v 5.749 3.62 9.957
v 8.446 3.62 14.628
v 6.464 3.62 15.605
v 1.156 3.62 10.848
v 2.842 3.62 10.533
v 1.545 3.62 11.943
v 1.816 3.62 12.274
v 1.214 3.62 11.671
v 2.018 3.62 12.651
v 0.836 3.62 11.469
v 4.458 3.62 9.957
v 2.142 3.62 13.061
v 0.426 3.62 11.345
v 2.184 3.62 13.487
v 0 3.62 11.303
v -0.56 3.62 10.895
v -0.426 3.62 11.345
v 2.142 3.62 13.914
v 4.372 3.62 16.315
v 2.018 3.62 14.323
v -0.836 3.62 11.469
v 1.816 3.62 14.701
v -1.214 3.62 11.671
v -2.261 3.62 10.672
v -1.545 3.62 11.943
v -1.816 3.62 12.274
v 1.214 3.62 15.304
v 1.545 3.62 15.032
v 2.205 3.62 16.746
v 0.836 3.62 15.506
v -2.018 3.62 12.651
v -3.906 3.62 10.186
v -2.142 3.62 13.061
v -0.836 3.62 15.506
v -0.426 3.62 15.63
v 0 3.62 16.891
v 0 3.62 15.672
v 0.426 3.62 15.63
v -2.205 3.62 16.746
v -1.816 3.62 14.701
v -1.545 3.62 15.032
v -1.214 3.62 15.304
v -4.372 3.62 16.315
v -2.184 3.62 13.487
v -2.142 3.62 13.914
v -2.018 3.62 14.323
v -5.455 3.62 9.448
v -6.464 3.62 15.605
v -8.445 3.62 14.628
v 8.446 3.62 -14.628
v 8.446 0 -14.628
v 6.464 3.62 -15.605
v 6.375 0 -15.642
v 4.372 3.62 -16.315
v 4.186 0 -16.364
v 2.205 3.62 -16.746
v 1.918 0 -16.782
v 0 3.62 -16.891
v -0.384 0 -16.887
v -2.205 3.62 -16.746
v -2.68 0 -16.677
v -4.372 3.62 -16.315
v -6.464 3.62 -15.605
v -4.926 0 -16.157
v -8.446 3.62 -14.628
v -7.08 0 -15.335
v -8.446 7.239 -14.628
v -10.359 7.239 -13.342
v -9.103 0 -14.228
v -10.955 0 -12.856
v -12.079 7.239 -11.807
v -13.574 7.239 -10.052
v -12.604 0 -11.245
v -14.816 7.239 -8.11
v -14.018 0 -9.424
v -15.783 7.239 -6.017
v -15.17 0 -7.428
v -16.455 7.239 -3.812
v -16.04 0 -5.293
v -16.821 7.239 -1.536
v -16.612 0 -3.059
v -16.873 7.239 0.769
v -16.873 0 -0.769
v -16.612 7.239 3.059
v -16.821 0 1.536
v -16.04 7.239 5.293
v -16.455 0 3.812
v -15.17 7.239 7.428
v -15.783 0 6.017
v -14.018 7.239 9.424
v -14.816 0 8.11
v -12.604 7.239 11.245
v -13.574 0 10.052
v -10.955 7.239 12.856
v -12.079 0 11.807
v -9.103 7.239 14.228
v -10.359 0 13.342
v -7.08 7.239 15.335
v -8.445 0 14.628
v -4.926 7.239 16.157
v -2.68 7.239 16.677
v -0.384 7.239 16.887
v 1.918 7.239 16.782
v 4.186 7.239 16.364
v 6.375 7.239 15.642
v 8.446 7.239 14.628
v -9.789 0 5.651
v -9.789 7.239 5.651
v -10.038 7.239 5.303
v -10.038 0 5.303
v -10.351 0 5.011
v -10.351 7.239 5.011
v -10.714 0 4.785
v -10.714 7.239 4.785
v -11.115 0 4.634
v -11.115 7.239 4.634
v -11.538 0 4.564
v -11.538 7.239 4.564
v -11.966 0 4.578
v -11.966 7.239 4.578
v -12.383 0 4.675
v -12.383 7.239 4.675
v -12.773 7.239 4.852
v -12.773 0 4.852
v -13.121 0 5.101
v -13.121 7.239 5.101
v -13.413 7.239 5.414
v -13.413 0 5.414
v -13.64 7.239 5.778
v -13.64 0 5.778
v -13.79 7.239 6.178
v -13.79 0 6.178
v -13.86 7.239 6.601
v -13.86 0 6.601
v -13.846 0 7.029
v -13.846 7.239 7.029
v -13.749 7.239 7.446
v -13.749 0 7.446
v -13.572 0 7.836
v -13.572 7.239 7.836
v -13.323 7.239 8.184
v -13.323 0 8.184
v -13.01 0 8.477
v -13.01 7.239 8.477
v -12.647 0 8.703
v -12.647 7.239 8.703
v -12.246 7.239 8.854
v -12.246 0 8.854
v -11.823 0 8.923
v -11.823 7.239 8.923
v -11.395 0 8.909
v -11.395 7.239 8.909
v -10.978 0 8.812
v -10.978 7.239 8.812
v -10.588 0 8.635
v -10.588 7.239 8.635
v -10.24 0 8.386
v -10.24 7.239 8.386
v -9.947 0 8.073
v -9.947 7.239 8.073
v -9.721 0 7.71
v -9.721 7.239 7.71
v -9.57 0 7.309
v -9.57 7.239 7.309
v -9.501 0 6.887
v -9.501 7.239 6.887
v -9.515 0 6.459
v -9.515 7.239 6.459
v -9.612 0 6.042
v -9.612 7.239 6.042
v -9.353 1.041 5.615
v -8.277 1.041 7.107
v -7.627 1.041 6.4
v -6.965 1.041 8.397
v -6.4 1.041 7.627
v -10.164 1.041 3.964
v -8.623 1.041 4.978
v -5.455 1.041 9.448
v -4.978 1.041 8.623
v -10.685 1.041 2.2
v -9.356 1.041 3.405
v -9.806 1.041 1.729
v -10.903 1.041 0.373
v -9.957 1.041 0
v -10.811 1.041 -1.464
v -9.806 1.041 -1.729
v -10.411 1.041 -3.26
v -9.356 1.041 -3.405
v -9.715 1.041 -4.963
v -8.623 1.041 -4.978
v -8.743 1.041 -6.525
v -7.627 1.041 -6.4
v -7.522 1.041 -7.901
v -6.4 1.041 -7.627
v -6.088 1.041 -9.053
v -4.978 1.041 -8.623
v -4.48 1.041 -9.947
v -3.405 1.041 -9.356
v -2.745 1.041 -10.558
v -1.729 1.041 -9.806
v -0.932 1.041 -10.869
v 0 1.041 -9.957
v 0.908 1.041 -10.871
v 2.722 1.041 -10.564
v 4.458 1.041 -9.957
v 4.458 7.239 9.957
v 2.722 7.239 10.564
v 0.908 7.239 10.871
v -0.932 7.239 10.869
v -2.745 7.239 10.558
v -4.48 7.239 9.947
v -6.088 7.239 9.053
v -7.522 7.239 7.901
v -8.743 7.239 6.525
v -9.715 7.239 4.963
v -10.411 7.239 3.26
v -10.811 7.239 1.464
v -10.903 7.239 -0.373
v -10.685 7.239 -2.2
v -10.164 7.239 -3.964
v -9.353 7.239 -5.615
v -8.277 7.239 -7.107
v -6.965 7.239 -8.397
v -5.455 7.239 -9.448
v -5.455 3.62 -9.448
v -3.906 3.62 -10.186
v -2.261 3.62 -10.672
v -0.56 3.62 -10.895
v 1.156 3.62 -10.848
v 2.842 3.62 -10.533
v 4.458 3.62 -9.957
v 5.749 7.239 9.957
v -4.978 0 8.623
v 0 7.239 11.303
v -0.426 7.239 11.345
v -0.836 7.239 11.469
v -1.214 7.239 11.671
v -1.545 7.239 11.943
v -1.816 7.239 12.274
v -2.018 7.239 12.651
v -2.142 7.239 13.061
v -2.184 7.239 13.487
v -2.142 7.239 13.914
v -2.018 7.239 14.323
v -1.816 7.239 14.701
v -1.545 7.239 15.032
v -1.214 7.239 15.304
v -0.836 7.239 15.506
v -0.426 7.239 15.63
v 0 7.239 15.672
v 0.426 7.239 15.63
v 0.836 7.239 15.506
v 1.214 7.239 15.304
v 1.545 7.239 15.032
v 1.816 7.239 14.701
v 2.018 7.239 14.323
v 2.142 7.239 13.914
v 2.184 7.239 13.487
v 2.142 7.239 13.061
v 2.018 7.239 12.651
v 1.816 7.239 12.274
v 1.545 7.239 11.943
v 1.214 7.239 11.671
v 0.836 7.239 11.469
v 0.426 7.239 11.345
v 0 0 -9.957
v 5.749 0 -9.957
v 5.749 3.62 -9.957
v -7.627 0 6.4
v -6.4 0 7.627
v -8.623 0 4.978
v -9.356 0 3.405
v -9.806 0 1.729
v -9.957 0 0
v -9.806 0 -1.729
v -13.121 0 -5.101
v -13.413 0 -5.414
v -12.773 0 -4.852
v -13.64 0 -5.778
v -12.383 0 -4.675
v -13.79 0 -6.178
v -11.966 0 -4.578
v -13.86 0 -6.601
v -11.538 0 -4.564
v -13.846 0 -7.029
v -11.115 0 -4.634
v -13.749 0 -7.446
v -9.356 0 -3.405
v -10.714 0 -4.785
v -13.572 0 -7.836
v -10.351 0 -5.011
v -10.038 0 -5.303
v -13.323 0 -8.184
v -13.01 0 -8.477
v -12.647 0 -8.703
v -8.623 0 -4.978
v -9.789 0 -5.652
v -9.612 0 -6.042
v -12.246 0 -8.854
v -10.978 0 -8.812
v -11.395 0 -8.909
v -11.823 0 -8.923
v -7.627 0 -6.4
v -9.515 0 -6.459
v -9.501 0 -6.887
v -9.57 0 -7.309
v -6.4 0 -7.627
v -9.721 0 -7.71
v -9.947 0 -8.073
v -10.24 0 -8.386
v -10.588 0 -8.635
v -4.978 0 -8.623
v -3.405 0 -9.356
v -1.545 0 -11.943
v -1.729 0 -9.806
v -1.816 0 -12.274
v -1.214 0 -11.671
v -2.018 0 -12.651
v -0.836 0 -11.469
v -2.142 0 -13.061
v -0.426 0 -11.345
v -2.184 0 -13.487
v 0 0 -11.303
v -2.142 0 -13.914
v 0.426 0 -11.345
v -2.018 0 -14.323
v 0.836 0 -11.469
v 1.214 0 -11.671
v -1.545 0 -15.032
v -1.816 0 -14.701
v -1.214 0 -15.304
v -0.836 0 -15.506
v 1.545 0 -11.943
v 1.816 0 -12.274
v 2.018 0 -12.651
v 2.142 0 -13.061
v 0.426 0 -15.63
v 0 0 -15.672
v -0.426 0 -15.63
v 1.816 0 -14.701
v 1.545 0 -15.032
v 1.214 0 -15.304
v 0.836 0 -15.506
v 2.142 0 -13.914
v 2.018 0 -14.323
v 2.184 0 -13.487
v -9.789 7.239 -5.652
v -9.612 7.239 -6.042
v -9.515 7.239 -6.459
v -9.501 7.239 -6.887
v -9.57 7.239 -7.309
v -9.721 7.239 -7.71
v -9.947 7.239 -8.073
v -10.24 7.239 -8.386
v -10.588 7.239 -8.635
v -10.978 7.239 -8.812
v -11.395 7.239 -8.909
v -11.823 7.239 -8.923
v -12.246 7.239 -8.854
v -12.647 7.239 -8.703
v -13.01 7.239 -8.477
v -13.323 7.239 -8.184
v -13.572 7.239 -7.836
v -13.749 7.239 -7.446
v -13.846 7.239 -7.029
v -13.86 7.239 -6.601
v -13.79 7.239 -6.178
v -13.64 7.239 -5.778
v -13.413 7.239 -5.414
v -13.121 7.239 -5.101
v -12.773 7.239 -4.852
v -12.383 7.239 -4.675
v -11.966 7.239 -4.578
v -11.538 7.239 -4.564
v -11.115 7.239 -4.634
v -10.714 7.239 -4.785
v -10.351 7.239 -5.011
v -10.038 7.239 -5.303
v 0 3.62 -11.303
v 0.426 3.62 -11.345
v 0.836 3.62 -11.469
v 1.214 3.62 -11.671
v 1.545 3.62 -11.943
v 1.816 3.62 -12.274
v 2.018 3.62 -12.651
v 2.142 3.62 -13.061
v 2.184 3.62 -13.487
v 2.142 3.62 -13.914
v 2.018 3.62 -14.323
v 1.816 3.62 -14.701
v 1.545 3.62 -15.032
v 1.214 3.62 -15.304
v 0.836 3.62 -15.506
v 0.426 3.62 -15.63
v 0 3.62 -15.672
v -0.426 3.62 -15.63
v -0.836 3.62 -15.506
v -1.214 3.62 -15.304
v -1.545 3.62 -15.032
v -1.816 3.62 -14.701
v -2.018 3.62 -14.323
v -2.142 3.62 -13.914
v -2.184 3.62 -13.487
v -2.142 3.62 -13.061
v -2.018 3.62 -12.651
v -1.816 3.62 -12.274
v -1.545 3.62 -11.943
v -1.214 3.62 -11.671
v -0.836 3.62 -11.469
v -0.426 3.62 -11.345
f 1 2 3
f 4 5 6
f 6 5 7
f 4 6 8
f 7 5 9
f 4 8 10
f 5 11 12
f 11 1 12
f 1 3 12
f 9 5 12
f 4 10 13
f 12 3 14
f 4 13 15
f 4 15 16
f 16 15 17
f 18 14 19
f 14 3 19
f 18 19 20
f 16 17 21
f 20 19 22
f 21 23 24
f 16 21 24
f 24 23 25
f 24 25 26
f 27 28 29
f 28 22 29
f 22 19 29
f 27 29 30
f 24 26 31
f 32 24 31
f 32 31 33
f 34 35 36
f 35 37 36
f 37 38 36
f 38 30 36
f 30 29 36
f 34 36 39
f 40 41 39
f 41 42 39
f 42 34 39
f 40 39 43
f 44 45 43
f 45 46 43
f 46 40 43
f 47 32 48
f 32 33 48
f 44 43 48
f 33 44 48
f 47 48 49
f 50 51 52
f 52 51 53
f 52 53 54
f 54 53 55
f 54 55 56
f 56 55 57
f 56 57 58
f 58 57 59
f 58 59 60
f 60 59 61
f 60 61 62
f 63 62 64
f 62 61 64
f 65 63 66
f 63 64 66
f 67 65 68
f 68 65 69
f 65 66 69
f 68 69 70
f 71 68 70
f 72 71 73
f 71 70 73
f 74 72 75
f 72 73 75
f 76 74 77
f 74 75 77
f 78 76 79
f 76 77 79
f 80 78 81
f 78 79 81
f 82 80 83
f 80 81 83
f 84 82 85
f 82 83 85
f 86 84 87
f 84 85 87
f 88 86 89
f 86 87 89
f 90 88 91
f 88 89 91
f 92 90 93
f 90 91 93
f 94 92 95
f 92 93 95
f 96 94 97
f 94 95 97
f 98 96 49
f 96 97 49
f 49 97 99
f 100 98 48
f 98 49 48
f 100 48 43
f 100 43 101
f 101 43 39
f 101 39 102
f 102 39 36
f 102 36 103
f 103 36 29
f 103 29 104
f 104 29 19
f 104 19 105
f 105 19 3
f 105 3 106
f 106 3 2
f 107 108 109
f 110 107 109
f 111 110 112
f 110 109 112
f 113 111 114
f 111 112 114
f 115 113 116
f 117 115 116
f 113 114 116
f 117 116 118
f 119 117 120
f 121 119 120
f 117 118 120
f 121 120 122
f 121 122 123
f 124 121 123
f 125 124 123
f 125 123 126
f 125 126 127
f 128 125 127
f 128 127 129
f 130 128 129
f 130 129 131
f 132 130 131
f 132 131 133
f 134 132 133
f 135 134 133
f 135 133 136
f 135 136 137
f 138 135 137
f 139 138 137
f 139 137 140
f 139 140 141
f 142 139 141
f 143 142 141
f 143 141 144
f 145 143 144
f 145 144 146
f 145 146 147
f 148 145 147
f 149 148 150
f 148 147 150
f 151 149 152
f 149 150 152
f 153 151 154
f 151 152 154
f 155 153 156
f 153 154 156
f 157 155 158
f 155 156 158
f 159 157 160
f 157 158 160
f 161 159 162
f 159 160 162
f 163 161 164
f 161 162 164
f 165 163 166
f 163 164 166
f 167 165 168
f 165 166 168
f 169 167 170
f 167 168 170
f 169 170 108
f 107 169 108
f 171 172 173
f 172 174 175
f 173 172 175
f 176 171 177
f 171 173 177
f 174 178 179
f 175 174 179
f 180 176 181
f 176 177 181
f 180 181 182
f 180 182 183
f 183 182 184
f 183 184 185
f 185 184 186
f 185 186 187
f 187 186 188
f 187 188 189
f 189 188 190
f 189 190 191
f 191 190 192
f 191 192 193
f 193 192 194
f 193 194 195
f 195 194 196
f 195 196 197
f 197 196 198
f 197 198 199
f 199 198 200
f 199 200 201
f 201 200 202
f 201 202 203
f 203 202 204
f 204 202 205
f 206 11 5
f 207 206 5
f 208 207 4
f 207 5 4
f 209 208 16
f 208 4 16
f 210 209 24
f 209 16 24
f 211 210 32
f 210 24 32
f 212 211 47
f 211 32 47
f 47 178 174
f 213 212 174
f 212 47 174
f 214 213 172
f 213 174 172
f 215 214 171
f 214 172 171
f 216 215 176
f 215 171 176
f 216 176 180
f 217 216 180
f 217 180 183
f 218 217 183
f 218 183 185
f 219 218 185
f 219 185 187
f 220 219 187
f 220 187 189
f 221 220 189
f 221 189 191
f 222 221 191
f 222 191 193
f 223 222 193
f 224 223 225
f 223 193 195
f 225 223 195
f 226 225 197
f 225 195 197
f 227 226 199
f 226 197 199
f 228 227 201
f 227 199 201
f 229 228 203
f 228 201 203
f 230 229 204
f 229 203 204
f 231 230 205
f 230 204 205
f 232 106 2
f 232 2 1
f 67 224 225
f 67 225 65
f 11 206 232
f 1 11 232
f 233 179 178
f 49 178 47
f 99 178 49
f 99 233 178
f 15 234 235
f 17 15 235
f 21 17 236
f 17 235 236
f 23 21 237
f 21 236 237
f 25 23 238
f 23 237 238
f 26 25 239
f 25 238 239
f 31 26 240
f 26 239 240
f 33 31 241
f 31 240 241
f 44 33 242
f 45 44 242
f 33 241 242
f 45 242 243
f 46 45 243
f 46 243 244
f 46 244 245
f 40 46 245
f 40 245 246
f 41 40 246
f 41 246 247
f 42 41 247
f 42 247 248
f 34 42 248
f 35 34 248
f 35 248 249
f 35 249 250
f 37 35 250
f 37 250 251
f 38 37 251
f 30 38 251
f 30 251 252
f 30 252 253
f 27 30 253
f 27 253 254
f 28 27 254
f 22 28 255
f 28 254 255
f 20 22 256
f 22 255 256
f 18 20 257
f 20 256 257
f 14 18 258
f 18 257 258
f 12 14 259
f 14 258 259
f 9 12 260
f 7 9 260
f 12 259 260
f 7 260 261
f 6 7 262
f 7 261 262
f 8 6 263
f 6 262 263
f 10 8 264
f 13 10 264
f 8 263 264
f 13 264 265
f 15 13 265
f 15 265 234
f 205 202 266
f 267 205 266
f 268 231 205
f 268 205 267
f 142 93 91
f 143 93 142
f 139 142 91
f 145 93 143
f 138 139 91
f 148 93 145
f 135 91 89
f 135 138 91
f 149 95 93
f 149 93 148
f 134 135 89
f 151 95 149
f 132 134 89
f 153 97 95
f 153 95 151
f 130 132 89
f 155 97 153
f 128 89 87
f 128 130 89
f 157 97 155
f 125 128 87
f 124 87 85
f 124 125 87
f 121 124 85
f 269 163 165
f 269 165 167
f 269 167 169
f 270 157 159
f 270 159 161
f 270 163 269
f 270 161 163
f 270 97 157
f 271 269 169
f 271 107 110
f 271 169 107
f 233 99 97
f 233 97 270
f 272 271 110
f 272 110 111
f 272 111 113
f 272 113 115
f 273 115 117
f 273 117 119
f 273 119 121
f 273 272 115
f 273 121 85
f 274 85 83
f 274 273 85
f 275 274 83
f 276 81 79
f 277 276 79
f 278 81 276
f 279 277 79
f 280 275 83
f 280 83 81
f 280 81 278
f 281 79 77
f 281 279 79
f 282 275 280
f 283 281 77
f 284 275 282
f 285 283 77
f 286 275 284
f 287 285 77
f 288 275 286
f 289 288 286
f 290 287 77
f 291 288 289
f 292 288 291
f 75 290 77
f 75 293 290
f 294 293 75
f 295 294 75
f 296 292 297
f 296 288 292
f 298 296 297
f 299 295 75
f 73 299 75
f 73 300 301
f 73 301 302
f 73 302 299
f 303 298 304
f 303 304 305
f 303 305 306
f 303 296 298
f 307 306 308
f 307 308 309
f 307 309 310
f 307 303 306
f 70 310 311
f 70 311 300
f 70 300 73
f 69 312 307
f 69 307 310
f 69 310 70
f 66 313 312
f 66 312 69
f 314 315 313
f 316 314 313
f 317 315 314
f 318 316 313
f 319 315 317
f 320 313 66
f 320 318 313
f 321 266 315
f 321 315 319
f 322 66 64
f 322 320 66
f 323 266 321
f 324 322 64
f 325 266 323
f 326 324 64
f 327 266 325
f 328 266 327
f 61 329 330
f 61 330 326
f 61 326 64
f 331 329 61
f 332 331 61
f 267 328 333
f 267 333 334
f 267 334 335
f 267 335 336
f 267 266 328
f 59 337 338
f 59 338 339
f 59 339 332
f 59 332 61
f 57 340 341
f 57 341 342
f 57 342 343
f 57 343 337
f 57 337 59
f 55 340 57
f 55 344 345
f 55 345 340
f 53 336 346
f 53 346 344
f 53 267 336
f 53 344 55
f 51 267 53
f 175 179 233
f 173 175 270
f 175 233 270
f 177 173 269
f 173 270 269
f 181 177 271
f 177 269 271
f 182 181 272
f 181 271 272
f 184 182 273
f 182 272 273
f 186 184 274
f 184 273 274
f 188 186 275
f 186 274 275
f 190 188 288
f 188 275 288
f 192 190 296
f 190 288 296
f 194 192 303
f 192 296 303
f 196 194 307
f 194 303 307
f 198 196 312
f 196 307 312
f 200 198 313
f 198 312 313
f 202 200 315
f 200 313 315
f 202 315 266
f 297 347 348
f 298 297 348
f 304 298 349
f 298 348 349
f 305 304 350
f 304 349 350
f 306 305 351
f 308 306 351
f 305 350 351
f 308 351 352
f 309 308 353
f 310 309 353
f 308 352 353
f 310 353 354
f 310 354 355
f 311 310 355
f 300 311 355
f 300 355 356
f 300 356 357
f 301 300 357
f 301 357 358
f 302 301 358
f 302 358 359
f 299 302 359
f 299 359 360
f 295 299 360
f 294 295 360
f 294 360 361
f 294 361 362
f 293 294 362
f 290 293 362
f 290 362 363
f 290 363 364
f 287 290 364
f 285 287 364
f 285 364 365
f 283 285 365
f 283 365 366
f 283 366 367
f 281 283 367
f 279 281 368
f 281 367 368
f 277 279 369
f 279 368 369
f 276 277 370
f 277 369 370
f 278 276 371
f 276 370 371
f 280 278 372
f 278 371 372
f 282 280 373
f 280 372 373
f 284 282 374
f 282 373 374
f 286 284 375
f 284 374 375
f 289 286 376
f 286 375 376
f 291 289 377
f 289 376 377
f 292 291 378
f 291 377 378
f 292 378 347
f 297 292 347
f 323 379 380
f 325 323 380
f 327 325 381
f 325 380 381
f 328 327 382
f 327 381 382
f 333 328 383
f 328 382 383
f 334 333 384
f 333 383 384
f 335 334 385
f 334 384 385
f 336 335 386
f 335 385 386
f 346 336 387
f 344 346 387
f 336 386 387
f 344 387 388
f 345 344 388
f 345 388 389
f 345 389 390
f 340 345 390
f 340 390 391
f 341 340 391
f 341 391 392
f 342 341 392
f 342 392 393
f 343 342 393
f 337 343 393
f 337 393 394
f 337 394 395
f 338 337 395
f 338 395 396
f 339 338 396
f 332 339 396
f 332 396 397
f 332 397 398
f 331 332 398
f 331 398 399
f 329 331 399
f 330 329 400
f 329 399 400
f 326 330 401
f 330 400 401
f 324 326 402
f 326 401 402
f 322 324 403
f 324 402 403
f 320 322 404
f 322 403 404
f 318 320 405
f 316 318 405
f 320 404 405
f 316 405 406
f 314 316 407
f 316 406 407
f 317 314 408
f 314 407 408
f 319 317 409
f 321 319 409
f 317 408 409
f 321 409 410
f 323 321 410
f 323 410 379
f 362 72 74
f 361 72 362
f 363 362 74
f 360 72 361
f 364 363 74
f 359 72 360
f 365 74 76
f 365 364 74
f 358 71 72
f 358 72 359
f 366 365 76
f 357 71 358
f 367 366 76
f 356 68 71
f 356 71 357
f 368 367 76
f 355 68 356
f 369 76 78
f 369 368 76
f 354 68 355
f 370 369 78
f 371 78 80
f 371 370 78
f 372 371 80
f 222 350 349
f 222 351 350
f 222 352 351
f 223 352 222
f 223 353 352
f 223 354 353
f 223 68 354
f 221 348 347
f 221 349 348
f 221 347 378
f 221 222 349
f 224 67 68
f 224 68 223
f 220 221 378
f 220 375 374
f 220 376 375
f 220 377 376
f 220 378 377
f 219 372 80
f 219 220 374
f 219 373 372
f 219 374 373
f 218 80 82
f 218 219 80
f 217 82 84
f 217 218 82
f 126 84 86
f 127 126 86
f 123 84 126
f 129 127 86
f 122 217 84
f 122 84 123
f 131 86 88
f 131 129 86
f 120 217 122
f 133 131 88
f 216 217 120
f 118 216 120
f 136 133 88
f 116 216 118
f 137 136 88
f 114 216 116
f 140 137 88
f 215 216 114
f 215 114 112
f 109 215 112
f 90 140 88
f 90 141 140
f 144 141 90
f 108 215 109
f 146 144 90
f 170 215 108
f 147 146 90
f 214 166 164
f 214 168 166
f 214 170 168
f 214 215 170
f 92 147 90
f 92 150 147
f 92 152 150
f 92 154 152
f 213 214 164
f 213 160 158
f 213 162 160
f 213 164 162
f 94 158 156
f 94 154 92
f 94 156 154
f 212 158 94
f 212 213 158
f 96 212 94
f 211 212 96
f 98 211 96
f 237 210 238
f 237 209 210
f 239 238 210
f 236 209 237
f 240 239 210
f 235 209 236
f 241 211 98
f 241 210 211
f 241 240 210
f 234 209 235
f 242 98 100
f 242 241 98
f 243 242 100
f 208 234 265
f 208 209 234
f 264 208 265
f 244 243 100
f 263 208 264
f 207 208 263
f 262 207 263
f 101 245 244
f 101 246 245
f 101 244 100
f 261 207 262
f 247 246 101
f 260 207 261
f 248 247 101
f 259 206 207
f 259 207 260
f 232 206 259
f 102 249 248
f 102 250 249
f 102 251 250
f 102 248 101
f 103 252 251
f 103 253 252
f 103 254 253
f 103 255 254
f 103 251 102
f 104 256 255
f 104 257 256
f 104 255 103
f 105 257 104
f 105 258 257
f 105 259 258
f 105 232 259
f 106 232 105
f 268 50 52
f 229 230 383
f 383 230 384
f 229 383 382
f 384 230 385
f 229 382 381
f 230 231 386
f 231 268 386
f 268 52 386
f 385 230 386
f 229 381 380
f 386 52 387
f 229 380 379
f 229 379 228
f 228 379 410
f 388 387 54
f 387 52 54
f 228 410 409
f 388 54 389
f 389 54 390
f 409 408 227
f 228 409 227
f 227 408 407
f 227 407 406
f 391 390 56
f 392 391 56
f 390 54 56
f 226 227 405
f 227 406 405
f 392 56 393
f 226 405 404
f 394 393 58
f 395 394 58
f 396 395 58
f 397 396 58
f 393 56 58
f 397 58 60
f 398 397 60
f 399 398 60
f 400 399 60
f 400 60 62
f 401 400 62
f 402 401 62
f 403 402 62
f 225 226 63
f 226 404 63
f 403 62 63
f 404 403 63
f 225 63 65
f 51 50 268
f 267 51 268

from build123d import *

# Parameters (mm, degrees)
SKETCH1_R         = 16.891
EXTRUDE1_DEPTH    = 7.239
SKETCH2_R         = 10.9093
EXTRUDE2_DEPTH    = 25.960266084
SKETCH3_R         = 10.9093
SKETCH3_R_2       = 9.9568
EXTRUDE3_DEPTH    = 1.0414
SKETCH4_R         = 2.1844
EXTRUDE4_DEPTH    = 25.960266084
CIRPATTERN1_COUNT = 6
SKETCH5_W         = 23.383447214
SKETCH5_H         = 19.9136
EXTRUDE6_DEPTH    = 25.960266084
EXTRUDE7_DEPTH    = 25.960266084
EXTRUDE8_DEPTH    = 3.6195
EXTRUDE9_DEPTH    = 3.6195


with BuildPart() as part:
    # Sketch1 → Extrude1 (new body)
    with BuildSketch(Plane(origin=(0, 0, 0), x_dir=(1, 0, 0), z_dir=(0, 1, 0))):
        with Locations(Location((0, 0, 0), (0, 0, 270))):
            Circle(SKETCH1_R)
    extrude(amount=EXTRUDE1_DEPTH)

    # Sketch2 → Extrude2 (cut, through all)
    with BuildSketch(Plane.XZ):
        with Locations(Location((0, 0, 0), (0, 0, 270))):
            Circle(SKETCH2_R)
    extrude(amount=-EXTRUDE2_DEPTH, mode=Mode.SUBTRACT)

    # Sketch3 → Extrude3 (add)
    with BuildSketch(Plane.XZ):
        with Locations(Location((0, 0, 0), (0, 0, 270))):
            Circle(SKETCH3_R)
        with Locations(Location((0, 0, 0), (0, 0, 270))):
            Circle(SKETCH3_R_2, mode=Mode.SUBTRACT)
    extrude(amount=-EXTRUDE3_DEPTH)

    # Sketch4 → Extrude4 (cut, through all)
    with BuildSketch(Plane(origin=(0, 7.239, 0), x_dir=(1, 0, 0), z_dir=(0, 1, 0))):
        with Locations(Location((0, 13.4874, 0), (0, 0, 270))):
            Circle(SKETCH4_R)
    extrude4 = extrude(amount=-EXTRUDE4_DEPTH, mode=Mode.SUBTRACT)

    # CirPattern1: Extrude4 ×6 about axis
    cirpattern1_axis = Axis((0, 0, 0), (0, 1, 0))
    for i in range(1, CIRPATTERN1_COUNT):
        add(extrude4.rotate(cirpattern1_axis, i * 360 / CIRPATTERN1_COUNT), mode=Mode.SUBTRACT)

    # Sketch5 → Extrude6 (cut, through all)
    with BuildSketch(Plane(origin=(0, 7.239, 0), x_dir=(1, 0, 0), z_dir=(0, 1, 0))):
        with Locations((11.691723607, 0)):
            Rectangle(SKETCH5_W, SKETCH5_H)
    extrude(amount=-EXTRUDE6_DEPTH, mode=Mode.SUBTRACT)

    # Sketch8 → Extrude7 (cut, through all)
    with BuildSketch(Plane(origin=(0, 7.239, 0), x_dir=(1, 0, 0), z_dir=(0, 1, 0))):
        Polygon((0, 0), (17.025211733, 0), (17.025211733, 29.488531731), align=None)
    extrude7 = extrude(amount=-EXTRUDE7_DEPTH, mode=Mode.SUBTRACT)

    # Mirror1: Extrude7 across plane
    add(extrude7.mirror(Plane.XY), mode=Mode.SUBTRACT)

    # Sketch9 → Extrude8 (cut)
    with BuildSketch(Plane(origin=(0, 7.239, 0), x_dir=(1, 0, 0), z_dir=(0, 1, 0))):
        Polygon((0, 0), (-11.081515353, 19.193747616), (11.081515353, 19.193747616), align=None)
    extrude(amount=-EXTRUDE8_DEPTH, mode=Mode.SUBTRACT)

    # Sketch10 → Extrude9 (cut)
    with BuildSketch(Plane.XZ):
        Polygon((0, 0), (-13.504747016, 23.390907976), (14.410908918, 24.960426429), align=None)
    extrude(amount=-EXTRUDE9_DEPTH, mode=Mode.SUBTRACT)


solid = part.part
